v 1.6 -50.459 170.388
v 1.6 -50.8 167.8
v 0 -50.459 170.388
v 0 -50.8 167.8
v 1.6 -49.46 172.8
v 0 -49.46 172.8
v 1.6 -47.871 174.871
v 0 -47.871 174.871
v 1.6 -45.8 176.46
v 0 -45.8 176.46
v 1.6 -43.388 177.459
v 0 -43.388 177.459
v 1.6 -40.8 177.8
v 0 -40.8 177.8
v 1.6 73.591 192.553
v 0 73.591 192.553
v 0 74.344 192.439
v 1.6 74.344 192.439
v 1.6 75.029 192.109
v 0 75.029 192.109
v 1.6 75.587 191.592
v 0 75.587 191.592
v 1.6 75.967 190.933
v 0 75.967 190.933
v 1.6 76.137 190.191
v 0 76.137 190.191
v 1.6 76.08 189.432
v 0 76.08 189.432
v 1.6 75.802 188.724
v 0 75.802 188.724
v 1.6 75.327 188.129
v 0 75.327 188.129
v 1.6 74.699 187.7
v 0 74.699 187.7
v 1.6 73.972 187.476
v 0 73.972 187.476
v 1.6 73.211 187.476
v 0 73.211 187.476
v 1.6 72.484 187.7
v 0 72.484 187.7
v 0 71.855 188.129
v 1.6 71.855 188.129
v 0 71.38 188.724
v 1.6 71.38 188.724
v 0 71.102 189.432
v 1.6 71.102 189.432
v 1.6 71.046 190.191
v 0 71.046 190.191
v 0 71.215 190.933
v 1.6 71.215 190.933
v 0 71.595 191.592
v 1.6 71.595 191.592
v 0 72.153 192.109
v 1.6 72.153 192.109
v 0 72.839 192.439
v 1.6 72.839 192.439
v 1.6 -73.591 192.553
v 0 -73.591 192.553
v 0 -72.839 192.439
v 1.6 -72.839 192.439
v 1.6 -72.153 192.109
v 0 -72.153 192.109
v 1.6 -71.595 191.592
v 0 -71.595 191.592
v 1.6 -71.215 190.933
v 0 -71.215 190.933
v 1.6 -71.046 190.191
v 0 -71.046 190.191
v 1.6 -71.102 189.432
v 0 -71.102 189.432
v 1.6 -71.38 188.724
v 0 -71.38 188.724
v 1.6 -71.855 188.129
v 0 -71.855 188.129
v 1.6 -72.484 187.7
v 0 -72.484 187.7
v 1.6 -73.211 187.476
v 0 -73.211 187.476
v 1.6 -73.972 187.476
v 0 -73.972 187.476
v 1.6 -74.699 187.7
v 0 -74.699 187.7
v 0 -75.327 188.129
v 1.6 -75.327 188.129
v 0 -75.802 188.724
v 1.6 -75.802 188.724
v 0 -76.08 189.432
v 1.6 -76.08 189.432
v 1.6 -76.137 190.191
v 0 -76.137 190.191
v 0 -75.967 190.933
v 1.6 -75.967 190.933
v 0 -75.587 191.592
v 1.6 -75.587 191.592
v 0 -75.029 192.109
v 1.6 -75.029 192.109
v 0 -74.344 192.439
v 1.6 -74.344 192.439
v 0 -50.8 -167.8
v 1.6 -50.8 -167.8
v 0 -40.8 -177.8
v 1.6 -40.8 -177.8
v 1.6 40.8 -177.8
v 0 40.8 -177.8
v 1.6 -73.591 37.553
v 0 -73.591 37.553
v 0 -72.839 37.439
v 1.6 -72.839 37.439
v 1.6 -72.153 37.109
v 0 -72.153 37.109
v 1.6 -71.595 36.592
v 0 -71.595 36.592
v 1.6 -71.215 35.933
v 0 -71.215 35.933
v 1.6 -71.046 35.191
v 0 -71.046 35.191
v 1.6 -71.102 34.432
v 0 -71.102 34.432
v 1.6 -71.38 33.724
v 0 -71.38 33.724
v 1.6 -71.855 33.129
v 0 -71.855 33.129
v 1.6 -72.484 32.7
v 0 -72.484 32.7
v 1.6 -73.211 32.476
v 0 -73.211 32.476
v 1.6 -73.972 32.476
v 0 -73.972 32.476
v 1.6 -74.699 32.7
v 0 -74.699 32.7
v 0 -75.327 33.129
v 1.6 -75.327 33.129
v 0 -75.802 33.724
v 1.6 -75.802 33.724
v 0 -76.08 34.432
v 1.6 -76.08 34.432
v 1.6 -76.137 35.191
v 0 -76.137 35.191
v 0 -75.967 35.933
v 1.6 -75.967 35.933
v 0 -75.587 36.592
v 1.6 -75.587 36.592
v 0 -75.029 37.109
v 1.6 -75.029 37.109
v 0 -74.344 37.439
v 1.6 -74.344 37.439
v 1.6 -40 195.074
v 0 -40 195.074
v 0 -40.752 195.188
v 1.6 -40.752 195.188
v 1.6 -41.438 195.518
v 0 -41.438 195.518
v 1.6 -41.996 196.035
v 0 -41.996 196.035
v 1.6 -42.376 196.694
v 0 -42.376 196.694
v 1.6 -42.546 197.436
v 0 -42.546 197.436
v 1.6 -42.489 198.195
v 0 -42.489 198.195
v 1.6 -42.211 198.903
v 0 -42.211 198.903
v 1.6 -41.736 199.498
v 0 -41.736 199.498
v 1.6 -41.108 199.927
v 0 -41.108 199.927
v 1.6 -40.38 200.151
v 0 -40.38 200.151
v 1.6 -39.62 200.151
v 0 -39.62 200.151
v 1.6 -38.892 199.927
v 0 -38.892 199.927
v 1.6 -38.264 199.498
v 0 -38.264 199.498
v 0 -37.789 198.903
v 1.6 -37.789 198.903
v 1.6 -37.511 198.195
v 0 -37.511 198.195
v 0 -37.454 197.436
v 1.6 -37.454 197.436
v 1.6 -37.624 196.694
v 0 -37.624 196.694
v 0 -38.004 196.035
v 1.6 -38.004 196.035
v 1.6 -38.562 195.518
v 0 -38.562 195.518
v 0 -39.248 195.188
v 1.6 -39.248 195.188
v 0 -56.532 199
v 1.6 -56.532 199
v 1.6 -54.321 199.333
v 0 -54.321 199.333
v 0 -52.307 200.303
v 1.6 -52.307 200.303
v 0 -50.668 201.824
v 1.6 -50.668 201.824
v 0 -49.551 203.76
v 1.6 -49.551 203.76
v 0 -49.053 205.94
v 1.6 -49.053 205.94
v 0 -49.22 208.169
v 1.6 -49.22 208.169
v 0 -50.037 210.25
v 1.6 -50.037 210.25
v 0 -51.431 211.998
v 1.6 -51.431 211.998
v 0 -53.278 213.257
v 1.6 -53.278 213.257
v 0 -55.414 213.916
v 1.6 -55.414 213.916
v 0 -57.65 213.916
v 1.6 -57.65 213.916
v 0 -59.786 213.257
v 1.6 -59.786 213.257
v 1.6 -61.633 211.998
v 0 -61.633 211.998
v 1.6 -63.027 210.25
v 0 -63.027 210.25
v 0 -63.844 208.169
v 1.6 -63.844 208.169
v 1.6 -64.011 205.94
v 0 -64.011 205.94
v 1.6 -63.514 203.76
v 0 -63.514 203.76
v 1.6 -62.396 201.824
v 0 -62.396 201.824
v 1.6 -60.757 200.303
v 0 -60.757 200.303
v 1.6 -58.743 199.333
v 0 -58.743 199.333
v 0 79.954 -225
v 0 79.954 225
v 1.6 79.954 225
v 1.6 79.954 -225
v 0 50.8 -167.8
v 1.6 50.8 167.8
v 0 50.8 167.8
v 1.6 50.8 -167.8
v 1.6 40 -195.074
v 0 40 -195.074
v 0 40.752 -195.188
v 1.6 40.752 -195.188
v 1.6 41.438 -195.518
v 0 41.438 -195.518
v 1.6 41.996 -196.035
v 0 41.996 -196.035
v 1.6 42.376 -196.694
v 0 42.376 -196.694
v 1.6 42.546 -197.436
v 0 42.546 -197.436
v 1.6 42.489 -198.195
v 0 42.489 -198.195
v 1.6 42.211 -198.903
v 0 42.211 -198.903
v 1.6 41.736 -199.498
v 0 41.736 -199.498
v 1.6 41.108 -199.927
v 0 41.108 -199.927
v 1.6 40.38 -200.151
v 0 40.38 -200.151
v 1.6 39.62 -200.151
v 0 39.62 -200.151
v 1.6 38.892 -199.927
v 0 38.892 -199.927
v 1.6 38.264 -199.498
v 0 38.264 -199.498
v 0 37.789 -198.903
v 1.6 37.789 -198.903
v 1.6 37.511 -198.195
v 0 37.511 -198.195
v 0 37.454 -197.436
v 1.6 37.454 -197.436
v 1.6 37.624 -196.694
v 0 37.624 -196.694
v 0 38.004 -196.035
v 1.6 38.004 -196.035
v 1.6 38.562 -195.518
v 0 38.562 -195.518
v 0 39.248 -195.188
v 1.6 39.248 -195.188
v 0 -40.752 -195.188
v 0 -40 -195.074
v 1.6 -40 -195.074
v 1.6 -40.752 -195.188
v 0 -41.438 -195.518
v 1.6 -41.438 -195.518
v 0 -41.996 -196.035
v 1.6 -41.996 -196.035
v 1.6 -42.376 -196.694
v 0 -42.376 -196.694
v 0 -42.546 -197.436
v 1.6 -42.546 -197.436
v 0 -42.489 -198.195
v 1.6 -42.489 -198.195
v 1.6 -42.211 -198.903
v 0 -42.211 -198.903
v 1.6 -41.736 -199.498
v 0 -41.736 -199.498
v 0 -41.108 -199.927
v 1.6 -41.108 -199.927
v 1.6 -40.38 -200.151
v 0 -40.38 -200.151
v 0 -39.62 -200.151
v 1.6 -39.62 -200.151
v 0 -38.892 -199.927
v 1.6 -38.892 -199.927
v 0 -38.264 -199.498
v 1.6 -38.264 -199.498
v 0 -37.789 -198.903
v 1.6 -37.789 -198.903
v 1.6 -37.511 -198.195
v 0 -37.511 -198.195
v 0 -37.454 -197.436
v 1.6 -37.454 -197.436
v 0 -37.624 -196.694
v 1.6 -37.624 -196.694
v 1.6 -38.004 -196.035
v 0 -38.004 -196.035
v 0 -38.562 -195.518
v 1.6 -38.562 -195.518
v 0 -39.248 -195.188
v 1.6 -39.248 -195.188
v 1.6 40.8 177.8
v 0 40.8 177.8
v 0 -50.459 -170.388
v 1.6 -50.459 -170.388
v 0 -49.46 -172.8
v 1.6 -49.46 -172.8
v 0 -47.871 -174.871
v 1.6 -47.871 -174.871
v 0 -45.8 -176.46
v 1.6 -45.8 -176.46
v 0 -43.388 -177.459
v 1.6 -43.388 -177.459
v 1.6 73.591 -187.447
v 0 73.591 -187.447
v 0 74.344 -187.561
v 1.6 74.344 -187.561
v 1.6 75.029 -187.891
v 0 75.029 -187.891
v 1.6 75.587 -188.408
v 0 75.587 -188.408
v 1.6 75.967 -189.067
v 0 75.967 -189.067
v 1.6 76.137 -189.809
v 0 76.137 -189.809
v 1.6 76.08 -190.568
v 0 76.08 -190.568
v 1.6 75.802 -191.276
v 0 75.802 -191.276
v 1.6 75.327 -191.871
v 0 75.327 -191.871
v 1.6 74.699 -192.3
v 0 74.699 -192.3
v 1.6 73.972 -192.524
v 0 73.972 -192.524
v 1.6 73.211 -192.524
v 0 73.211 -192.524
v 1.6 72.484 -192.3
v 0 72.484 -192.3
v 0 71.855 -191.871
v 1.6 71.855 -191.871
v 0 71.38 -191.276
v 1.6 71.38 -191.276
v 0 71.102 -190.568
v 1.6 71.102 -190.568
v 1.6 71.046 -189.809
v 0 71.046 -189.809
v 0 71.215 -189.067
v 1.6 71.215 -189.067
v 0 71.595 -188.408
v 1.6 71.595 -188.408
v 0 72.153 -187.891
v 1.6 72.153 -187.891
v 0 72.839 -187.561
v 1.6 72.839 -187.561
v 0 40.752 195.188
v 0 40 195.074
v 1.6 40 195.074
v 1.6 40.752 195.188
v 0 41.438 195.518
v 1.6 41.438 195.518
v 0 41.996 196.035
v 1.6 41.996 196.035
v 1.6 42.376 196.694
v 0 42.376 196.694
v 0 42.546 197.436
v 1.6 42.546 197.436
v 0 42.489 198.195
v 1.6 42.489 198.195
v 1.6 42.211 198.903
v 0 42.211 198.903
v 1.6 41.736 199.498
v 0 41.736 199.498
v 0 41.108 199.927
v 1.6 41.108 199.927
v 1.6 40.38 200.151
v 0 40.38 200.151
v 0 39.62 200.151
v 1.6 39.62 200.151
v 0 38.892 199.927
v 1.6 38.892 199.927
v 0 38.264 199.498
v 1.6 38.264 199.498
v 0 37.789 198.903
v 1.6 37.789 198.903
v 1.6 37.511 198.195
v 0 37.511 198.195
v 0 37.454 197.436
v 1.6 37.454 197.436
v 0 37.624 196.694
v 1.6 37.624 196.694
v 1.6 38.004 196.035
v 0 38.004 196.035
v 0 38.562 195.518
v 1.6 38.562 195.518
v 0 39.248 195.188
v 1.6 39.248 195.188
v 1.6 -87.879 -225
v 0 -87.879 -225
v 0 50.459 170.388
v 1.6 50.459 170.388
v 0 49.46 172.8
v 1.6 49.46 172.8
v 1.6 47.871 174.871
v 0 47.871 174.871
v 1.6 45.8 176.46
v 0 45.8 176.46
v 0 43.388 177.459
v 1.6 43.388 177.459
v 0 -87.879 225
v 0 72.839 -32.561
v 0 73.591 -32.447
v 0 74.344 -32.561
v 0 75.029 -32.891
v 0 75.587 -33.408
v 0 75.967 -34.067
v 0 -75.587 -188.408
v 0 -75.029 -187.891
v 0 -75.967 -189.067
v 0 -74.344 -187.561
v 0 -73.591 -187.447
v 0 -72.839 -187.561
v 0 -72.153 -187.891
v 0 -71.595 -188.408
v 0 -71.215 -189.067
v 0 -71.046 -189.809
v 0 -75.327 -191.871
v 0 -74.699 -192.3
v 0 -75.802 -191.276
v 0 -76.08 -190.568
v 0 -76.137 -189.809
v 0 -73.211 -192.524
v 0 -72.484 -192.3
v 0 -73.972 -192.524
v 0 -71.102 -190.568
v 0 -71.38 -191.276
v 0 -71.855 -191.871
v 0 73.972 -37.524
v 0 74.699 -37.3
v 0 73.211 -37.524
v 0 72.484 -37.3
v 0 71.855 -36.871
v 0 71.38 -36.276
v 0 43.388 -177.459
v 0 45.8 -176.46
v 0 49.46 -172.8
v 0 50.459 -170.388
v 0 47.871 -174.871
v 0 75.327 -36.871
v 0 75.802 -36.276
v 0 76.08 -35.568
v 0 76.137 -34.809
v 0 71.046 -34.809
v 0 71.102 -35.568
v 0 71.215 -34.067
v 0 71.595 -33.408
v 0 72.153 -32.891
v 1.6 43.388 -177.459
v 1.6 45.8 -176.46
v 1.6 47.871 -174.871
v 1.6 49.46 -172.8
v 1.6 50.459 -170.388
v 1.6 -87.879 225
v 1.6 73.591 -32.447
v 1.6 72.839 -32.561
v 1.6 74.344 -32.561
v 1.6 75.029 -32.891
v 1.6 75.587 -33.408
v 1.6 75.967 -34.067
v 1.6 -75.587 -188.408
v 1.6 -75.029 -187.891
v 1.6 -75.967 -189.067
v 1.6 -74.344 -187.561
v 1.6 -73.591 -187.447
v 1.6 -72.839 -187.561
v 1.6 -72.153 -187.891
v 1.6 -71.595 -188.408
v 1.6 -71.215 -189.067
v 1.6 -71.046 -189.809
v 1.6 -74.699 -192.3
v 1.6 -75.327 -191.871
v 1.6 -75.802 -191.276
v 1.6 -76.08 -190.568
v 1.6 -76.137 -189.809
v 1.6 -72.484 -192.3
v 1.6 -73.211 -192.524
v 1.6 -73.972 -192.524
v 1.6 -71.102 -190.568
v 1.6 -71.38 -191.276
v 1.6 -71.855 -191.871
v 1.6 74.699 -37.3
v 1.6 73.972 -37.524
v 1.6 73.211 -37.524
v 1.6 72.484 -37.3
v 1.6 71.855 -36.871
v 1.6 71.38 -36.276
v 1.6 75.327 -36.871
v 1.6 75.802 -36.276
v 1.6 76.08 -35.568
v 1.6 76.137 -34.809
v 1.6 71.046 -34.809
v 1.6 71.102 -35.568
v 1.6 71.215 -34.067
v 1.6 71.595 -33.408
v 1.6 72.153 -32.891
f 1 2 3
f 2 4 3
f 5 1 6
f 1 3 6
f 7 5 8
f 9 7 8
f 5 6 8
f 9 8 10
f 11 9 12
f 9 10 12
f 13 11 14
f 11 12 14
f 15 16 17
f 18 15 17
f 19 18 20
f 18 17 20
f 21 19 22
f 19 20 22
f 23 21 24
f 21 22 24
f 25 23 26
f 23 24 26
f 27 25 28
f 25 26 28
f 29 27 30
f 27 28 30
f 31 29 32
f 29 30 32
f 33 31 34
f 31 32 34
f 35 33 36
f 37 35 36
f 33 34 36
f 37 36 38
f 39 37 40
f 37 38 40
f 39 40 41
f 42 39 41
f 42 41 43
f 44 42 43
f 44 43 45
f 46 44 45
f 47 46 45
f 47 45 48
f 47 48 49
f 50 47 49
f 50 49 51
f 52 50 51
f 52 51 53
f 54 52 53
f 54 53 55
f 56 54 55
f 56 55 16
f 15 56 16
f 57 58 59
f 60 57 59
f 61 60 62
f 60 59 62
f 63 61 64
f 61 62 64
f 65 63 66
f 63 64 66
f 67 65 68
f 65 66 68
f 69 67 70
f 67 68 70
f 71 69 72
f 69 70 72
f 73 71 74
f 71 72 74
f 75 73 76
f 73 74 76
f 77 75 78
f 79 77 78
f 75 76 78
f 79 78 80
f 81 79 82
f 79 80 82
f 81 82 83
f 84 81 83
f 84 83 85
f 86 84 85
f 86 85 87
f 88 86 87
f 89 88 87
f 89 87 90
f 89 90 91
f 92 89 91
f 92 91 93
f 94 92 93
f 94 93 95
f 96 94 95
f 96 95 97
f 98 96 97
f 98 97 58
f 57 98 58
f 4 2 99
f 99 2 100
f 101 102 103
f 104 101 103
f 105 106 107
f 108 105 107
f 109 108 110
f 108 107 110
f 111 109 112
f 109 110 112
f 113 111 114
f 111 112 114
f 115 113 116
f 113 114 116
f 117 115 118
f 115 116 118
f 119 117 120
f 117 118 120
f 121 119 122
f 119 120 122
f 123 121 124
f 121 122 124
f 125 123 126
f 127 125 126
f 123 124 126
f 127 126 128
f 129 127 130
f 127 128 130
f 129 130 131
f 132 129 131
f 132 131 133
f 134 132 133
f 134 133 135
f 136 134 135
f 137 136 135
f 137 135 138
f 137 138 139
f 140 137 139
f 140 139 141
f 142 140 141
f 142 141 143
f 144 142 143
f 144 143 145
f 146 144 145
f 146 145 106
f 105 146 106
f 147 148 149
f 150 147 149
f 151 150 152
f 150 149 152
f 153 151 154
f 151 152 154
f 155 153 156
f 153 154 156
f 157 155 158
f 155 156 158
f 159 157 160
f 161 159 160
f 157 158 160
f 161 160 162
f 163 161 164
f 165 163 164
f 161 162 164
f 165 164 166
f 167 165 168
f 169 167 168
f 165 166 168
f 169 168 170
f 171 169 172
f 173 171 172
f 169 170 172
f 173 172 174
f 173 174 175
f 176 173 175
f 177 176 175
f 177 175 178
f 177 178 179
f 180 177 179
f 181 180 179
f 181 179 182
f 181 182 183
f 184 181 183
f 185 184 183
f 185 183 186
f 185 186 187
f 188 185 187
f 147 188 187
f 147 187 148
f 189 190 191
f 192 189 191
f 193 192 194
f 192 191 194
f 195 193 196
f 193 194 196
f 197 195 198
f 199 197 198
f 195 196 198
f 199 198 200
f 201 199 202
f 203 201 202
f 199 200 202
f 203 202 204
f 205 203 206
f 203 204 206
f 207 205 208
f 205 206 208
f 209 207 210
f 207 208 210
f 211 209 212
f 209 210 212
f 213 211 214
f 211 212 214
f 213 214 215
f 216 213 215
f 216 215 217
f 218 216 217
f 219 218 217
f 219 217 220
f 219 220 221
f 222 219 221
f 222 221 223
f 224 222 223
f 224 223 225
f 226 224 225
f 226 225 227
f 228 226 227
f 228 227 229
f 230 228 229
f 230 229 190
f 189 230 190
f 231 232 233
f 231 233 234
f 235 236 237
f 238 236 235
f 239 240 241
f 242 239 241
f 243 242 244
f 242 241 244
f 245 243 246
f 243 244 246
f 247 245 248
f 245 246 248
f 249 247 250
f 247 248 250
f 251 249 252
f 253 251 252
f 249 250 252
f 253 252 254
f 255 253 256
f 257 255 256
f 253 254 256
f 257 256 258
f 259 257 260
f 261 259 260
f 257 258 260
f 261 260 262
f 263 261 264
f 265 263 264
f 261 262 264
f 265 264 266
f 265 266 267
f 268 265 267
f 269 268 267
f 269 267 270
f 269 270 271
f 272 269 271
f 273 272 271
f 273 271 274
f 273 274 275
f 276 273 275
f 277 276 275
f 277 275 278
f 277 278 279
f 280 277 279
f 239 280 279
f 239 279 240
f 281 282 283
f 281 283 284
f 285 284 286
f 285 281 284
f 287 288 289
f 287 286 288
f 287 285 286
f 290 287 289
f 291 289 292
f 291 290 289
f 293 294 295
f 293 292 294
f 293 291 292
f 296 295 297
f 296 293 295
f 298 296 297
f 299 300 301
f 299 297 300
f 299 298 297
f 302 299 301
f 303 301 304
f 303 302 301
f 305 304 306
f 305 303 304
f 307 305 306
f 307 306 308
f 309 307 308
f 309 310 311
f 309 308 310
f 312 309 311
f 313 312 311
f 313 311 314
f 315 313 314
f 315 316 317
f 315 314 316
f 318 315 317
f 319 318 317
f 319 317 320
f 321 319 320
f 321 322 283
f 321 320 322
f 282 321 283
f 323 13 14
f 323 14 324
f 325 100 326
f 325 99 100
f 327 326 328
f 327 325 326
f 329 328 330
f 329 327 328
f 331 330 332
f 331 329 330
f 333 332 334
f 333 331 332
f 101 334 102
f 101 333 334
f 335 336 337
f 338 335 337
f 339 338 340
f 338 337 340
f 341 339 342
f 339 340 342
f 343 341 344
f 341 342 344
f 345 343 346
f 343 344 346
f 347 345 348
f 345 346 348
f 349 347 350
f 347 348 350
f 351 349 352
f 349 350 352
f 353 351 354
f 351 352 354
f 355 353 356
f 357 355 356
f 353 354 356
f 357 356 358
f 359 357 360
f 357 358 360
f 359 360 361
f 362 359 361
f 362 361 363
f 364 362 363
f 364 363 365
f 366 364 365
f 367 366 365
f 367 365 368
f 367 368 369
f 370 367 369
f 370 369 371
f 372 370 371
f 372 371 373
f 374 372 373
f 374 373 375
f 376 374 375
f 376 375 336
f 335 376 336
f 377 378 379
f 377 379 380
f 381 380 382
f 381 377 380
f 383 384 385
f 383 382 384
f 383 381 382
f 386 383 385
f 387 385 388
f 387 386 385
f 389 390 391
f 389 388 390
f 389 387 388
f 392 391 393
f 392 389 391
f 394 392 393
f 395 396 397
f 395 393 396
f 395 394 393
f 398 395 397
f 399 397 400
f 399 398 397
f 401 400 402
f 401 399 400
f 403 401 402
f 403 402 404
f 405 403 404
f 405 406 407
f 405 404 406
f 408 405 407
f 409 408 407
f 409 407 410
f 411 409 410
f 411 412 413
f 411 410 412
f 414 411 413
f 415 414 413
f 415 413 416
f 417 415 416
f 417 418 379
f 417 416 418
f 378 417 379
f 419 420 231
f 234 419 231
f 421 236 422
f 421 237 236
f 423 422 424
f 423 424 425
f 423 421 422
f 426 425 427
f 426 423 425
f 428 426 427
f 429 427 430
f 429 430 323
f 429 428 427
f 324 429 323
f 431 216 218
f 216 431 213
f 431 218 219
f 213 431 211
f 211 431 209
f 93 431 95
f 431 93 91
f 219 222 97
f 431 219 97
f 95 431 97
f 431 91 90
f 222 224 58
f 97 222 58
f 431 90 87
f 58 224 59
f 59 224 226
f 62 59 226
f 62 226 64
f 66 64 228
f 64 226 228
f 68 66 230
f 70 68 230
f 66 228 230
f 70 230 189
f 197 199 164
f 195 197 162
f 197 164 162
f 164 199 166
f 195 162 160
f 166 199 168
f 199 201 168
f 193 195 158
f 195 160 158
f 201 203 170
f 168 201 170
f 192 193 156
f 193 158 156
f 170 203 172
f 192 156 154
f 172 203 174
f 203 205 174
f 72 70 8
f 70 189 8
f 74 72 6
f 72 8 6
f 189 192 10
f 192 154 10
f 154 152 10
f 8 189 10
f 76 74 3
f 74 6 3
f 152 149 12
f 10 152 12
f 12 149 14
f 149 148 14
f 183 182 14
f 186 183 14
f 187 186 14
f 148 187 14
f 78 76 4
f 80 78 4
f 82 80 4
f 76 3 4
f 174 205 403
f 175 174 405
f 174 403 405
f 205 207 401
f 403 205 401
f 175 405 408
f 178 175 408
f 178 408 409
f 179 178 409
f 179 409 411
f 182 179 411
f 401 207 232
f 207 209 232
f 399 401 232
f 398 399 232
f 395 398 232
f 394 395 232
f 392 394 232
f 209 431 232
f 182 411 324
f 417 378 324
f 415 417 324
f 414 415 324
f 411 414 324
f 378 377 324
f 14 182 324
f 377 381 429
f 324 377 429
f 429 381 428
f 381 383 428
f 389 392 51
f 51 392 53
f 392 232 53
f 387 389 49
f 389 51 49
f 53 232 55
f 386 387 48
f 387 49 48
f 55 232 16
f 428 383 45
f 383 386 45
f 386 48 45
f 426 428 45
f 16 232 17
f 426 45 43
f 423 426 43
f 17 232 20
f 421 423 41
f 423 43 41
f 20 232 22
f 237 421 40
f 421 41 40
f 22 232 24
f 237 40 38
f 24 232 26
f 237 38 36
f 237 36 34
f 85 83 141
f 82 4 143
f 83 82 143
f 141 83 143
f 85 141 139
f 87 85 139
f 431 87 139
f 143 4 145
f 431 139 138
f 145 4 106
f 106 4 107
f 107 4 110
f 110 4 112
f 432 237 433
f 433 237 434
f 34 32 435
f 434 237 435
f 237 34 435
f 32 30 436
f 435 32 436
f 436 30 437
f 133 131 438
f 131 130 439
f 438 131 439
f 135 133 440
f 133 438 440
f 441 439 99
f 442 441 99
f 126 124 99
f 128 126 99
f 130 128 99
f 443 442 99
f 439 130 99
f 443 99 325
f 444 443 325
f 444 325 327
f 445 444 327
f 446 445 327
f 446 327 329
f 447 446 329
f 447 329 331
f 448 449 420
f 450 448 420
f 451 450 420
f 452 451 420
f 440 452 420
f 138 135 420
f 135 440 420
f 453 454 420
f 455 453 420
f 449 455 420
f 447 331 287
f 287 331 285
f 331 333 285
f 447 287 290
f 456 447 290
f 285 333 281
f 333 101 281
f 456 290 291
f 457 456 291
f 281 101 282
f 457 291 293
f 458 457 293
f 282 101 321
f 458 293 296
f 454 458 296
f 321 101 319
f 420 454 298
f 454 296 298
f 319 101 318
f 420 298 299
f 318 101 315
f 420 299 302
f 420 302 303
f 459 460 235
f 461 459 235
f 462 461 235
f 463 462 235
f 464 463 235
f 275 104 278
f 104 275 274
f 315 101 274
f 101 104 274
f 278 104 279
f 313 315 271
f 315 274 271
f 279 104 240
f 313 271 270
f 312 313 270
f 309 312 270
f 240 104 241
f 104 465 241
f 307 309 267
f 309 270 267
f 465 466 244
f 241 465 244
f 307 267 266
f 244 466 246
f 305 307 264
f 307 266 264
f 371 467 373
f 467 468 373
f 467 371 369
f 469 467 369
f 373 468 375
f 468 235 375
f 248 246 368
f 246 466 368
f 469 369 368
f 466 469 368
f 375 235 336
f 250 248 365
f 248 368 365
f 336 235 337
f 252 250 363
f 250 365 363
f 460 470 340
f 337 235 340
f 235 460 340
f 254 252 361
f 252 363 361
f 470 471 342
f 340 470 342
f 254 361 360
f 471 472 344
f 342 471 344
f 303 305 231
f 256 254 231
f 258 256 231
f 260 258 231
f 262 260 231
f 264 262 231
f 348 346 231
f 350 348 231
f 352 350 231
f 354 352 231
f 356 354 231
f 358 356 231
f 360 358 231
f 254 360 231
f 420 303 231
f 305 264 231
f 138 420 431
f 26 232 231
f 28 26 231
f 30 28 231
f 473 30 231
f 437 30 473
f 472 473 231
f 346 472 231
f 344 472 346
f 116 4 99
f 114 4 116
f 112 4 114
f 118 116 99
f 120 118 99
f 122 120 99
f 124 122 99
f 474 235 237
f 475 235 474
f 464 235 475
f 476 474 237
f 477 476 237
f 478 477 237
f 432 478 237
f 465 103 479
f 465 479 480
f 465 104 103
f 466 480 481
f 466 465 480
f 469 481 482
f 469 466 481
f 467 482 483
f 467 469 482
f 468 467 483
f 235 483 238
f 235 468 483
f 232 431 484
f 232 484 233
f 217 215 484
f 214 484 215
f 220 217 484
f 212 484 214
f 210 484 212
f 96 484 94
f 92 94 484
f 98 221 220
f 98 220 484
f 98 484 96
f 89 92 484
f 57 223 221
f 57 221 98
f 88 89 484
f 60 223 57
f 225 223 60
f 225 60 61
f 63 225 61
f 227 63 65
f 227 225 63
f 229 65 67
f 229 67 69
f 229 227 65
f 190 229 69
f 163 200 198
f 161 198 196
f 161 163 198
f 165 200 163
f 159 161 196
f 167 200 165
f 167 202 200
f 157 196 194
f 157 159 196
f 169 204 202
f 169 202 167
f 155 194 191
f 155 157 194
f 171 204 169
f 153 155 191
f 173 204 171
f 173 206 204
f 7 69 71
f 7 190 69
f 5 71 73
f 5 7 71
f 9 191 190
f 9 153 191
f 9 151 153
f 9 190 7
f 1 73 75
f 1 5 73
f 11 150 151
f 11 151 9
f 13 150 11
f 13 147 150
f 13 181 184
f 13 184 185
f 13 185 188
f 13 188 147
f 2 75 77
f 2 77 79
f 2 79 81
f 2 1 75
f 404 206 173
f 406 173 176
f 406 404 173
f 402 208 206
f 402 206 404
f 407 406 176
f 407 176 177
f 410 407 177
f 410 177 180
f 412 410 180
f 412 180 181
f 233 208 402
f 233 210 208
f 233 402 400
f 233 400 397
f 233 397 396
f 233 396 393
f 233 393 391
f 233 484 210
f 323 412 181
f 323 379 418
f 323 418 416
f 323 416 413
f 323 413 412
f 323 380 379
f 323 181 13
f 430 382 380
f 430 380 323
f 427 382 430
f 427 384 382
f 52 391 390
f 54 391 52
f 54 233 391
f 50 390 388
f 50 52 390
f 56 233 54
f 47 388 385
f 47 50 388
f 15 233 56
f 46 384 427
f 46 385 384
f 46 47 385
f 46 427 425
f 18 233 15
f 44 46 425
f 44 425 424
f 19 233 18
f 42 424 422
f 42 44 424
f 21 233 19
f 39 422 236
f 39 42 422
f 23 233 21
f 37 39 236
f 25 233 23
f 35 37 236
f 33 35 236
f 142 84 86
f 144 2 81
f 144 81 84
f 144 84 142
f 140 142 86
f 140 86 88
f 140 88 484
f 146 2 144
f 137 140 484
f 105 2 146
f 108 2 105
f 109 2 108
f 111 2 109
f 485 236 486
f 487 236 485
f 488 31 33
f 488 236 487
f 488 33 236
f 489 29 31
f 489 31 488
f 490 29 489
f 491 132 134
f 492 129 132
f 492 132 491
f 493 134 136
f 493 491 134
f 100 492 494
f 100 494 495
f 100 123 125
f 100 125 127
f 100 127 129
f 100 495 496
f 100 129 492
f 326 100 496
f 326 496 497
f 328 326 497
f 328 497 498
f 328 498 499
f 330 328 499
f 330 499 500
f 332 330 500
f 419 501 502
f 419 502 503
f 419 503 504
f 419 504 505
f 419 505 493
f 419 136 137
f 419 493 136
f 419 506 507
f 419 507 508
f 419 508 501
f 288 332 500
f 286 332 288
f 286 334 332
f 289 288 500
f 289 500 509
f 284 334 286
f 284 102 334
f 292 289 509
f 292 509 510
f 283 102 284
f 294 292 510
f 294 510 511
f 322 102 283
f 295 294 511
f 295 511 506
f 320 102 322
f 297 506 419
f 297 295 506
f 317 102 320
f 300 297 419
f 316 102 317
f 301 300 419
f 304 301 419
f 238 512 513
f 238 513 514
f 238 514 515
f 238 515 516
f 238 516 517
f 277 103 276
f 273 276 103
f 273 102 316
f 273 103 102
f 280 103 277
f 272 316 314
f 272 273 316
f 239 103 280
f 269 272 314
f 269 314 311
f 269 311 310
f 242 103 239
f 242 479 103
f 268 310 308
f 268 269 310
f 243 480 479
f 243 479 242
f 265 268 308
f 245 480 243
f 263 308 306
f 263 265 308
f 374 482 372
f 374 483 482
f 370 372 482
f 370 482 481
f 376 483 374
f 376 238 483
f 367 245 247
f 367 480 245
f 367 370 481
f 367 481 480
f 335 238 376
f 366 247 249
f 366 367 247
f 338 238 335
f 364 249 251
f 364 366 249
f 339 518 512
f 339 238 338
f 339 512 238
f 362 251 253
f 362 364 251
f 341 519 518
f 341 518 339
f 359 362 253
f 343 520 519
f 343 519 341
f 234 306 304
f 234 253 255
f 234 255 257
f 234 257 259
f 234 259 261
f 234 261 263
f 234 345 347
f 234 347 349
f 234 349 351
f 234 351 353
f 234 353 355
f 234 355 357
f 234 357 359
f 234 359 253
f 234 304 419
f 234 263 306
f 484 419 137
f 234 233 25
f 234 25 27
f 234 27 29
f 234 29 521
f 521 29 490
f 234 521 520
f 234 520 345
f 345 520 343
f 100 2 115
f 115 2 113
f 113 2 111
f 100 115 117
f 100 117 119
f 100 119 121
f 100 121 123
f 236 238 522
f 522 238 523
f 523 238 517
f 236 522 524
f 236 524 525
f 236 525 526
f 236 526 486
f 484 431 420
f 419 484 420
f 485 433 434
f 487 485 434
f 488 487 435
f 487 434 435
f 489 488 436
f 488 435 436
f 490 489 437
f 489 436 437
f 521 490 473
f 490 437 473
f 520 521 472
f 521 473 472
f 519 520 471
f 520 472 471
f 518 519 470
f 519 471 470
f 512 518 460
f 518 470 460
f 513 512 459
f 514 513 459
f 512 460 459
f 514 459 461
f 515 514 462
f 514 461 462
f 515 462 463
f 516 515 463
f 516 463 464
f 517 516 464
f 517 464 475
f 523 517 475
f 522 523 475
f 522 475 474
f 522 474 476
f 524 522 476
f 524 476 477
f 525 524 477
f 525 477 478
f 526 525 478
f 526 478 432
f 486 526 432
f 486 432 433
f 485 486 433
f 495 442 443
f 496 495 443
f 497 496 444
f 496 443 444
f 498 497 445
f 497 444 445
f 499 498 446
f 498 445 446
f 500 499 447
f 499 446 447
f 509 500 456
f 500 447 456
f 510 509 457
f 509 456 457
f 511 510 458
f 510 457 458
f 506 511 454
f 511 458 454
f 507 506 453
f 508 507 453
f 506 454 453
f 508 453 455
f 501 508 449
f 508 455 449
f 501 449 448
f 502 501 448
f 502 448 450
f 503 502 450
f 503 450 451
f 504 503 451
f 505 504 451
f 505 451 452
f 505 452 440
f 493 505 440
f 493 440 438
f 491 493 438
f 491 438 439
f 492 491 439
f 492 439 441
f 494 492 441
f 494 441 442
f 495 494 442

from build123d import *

# Parameters (mm, degrees)
SKETCH1_W                  = 450
SKETCH1_H                  = 167.8324167
BOSS_EXTRUDE1_DEPTH        = 1.6002
F_10_CLEARANCE_HOLE1_D     = 5.1054
F_10_CLEARANCE_HOLE1_DEPTH = 129.53
F_10_CLEARANCE_HOLE1_TIP   = 1.533816902
SKETCH4_R                  = 7.5
CUT_EXTRUDE1_DEPTH         = 2.6002
SKETCH5_W                  = 355.6
SKETCH5_H                  = 101.6
CUT_EXTRUDE2_DEPTH         = 2.6002
FILLET1_R                  = 10
F_10_CLEARANCE_HOLE2_D     = 5.1054
MIRROR2_COPY_1_D           = 5.1054


with BuildPart() as part:
    # Sketch1 → Boss-Extrude1 (new body)
    with BuildSketch(Plane(origin=(0, 0, 0), x_dir=(0, 0, -1), z_dir=(1, 0, 0))):
        with Locations((0, -3.9624)):
            Rectangle(SKETCH1_W, SKETCH1_H)
    extrude(amount=BOSS_EXTRUDE1_DEPTH)

    # #10 Clearance Hole1
    with Locations(Plane(origin=(1.6002, 0, 0), x_dir=(0, 0, -1), z_dir=(1, 0, 0))):
        with Locations((-190, 73.59110835), (35, 73.59110835), (-35, -73.59110835), (-190, -73.59110835), (190, 73.59110835), (190, -73.59110835)):
            Hole(F_10_CLEARANCE_HOLE1_D / 2, depth=F_10_CLEARANCE_HOLE1_DEPTH)
            with Locations((0, 0, -(F_10_CLEARANCE_HOLE1_DEPTH + F_10_CLEARANCE_HOLE1_TIP / 2))):  # 118° drill point
                Cone(0, F_10_CLEARANCE_HOLE1_D / 2, F_10_CLEARANCE_HOLE1_TIP, mode=Mode.SUBTRACT)

    # Sketch4 → Cut-Extrude1 (cut, through all)
    with BuildSketch(Plane(origin=(1.6002, 0, 0), x_dir=(0, 0, -1), z_dir=(1, 0, 0))):
        with Locations((-206.5, -56.5321)):
            Circle(SKETCH4_R)
    extrude(amount=-CUT_EXTRUDE1_DEPTH, mode=Mode.SUBTRACT)

    # Sketch5 → Cut-Extrude2 (cut, through all)
    with BuildSketch(Plane(origin=(1.6002, 0, 0), x_dir=(0, 0, -1), z_dir=(1, 0, 0))):
        Rectangle(SKETCH5_W, SKETCH5_H)
    extrude(amount=-CUT_EXTRUDE2_DEPTH, mode=Mode.SUBTRACT)

    # Fillet1
    fillet1_edges = [part.edges().sort_by_distance(p)[0] for p in [
        (0.8001, -50.8, 177.8),
        (0.8001, 50.8, 177.8),
        (0.8001, 50.8, -177.8),
        (0.8001, -50.8, -177.8),
    ]]
    fillet(fillet1_edges, radius=FILLET1_R)

    # #10 Clearance Hole2 (through all)
    with Locations(Plane(origin=(1.6002, 0, 0), x_dir=(0, 0, -1), z_dir=(1, 0, 0))):
        with Locations((197.627, 40)):
            f_10_clearance_hole2 = Hole(F_10_CLEARANCE_HOLE2_D / 2)

    # Mirror1: #10 Clearance Hole2 across plane
    add(f_10_clearance_hole2.mirror(Plane.ZX), mode=Mode.SUBTRACT)

    # Mirror2: #10 Clearance Hole2 across plane
    add(f_10_clearance_hole2.mirror(Plane.XY), mode=Mode.SUBTRACT)

    # Mirror2 copy 1 (through all)
    with Locations(Plane(origin=(1.6002, 0, 0), x_dir=(0, 0, 1), z_dir=(1, 0, 0))):
        with Locations((197.627, 40)):
            Hole(MIRROR2_COPY_1_D / 2)


solid = part.part
